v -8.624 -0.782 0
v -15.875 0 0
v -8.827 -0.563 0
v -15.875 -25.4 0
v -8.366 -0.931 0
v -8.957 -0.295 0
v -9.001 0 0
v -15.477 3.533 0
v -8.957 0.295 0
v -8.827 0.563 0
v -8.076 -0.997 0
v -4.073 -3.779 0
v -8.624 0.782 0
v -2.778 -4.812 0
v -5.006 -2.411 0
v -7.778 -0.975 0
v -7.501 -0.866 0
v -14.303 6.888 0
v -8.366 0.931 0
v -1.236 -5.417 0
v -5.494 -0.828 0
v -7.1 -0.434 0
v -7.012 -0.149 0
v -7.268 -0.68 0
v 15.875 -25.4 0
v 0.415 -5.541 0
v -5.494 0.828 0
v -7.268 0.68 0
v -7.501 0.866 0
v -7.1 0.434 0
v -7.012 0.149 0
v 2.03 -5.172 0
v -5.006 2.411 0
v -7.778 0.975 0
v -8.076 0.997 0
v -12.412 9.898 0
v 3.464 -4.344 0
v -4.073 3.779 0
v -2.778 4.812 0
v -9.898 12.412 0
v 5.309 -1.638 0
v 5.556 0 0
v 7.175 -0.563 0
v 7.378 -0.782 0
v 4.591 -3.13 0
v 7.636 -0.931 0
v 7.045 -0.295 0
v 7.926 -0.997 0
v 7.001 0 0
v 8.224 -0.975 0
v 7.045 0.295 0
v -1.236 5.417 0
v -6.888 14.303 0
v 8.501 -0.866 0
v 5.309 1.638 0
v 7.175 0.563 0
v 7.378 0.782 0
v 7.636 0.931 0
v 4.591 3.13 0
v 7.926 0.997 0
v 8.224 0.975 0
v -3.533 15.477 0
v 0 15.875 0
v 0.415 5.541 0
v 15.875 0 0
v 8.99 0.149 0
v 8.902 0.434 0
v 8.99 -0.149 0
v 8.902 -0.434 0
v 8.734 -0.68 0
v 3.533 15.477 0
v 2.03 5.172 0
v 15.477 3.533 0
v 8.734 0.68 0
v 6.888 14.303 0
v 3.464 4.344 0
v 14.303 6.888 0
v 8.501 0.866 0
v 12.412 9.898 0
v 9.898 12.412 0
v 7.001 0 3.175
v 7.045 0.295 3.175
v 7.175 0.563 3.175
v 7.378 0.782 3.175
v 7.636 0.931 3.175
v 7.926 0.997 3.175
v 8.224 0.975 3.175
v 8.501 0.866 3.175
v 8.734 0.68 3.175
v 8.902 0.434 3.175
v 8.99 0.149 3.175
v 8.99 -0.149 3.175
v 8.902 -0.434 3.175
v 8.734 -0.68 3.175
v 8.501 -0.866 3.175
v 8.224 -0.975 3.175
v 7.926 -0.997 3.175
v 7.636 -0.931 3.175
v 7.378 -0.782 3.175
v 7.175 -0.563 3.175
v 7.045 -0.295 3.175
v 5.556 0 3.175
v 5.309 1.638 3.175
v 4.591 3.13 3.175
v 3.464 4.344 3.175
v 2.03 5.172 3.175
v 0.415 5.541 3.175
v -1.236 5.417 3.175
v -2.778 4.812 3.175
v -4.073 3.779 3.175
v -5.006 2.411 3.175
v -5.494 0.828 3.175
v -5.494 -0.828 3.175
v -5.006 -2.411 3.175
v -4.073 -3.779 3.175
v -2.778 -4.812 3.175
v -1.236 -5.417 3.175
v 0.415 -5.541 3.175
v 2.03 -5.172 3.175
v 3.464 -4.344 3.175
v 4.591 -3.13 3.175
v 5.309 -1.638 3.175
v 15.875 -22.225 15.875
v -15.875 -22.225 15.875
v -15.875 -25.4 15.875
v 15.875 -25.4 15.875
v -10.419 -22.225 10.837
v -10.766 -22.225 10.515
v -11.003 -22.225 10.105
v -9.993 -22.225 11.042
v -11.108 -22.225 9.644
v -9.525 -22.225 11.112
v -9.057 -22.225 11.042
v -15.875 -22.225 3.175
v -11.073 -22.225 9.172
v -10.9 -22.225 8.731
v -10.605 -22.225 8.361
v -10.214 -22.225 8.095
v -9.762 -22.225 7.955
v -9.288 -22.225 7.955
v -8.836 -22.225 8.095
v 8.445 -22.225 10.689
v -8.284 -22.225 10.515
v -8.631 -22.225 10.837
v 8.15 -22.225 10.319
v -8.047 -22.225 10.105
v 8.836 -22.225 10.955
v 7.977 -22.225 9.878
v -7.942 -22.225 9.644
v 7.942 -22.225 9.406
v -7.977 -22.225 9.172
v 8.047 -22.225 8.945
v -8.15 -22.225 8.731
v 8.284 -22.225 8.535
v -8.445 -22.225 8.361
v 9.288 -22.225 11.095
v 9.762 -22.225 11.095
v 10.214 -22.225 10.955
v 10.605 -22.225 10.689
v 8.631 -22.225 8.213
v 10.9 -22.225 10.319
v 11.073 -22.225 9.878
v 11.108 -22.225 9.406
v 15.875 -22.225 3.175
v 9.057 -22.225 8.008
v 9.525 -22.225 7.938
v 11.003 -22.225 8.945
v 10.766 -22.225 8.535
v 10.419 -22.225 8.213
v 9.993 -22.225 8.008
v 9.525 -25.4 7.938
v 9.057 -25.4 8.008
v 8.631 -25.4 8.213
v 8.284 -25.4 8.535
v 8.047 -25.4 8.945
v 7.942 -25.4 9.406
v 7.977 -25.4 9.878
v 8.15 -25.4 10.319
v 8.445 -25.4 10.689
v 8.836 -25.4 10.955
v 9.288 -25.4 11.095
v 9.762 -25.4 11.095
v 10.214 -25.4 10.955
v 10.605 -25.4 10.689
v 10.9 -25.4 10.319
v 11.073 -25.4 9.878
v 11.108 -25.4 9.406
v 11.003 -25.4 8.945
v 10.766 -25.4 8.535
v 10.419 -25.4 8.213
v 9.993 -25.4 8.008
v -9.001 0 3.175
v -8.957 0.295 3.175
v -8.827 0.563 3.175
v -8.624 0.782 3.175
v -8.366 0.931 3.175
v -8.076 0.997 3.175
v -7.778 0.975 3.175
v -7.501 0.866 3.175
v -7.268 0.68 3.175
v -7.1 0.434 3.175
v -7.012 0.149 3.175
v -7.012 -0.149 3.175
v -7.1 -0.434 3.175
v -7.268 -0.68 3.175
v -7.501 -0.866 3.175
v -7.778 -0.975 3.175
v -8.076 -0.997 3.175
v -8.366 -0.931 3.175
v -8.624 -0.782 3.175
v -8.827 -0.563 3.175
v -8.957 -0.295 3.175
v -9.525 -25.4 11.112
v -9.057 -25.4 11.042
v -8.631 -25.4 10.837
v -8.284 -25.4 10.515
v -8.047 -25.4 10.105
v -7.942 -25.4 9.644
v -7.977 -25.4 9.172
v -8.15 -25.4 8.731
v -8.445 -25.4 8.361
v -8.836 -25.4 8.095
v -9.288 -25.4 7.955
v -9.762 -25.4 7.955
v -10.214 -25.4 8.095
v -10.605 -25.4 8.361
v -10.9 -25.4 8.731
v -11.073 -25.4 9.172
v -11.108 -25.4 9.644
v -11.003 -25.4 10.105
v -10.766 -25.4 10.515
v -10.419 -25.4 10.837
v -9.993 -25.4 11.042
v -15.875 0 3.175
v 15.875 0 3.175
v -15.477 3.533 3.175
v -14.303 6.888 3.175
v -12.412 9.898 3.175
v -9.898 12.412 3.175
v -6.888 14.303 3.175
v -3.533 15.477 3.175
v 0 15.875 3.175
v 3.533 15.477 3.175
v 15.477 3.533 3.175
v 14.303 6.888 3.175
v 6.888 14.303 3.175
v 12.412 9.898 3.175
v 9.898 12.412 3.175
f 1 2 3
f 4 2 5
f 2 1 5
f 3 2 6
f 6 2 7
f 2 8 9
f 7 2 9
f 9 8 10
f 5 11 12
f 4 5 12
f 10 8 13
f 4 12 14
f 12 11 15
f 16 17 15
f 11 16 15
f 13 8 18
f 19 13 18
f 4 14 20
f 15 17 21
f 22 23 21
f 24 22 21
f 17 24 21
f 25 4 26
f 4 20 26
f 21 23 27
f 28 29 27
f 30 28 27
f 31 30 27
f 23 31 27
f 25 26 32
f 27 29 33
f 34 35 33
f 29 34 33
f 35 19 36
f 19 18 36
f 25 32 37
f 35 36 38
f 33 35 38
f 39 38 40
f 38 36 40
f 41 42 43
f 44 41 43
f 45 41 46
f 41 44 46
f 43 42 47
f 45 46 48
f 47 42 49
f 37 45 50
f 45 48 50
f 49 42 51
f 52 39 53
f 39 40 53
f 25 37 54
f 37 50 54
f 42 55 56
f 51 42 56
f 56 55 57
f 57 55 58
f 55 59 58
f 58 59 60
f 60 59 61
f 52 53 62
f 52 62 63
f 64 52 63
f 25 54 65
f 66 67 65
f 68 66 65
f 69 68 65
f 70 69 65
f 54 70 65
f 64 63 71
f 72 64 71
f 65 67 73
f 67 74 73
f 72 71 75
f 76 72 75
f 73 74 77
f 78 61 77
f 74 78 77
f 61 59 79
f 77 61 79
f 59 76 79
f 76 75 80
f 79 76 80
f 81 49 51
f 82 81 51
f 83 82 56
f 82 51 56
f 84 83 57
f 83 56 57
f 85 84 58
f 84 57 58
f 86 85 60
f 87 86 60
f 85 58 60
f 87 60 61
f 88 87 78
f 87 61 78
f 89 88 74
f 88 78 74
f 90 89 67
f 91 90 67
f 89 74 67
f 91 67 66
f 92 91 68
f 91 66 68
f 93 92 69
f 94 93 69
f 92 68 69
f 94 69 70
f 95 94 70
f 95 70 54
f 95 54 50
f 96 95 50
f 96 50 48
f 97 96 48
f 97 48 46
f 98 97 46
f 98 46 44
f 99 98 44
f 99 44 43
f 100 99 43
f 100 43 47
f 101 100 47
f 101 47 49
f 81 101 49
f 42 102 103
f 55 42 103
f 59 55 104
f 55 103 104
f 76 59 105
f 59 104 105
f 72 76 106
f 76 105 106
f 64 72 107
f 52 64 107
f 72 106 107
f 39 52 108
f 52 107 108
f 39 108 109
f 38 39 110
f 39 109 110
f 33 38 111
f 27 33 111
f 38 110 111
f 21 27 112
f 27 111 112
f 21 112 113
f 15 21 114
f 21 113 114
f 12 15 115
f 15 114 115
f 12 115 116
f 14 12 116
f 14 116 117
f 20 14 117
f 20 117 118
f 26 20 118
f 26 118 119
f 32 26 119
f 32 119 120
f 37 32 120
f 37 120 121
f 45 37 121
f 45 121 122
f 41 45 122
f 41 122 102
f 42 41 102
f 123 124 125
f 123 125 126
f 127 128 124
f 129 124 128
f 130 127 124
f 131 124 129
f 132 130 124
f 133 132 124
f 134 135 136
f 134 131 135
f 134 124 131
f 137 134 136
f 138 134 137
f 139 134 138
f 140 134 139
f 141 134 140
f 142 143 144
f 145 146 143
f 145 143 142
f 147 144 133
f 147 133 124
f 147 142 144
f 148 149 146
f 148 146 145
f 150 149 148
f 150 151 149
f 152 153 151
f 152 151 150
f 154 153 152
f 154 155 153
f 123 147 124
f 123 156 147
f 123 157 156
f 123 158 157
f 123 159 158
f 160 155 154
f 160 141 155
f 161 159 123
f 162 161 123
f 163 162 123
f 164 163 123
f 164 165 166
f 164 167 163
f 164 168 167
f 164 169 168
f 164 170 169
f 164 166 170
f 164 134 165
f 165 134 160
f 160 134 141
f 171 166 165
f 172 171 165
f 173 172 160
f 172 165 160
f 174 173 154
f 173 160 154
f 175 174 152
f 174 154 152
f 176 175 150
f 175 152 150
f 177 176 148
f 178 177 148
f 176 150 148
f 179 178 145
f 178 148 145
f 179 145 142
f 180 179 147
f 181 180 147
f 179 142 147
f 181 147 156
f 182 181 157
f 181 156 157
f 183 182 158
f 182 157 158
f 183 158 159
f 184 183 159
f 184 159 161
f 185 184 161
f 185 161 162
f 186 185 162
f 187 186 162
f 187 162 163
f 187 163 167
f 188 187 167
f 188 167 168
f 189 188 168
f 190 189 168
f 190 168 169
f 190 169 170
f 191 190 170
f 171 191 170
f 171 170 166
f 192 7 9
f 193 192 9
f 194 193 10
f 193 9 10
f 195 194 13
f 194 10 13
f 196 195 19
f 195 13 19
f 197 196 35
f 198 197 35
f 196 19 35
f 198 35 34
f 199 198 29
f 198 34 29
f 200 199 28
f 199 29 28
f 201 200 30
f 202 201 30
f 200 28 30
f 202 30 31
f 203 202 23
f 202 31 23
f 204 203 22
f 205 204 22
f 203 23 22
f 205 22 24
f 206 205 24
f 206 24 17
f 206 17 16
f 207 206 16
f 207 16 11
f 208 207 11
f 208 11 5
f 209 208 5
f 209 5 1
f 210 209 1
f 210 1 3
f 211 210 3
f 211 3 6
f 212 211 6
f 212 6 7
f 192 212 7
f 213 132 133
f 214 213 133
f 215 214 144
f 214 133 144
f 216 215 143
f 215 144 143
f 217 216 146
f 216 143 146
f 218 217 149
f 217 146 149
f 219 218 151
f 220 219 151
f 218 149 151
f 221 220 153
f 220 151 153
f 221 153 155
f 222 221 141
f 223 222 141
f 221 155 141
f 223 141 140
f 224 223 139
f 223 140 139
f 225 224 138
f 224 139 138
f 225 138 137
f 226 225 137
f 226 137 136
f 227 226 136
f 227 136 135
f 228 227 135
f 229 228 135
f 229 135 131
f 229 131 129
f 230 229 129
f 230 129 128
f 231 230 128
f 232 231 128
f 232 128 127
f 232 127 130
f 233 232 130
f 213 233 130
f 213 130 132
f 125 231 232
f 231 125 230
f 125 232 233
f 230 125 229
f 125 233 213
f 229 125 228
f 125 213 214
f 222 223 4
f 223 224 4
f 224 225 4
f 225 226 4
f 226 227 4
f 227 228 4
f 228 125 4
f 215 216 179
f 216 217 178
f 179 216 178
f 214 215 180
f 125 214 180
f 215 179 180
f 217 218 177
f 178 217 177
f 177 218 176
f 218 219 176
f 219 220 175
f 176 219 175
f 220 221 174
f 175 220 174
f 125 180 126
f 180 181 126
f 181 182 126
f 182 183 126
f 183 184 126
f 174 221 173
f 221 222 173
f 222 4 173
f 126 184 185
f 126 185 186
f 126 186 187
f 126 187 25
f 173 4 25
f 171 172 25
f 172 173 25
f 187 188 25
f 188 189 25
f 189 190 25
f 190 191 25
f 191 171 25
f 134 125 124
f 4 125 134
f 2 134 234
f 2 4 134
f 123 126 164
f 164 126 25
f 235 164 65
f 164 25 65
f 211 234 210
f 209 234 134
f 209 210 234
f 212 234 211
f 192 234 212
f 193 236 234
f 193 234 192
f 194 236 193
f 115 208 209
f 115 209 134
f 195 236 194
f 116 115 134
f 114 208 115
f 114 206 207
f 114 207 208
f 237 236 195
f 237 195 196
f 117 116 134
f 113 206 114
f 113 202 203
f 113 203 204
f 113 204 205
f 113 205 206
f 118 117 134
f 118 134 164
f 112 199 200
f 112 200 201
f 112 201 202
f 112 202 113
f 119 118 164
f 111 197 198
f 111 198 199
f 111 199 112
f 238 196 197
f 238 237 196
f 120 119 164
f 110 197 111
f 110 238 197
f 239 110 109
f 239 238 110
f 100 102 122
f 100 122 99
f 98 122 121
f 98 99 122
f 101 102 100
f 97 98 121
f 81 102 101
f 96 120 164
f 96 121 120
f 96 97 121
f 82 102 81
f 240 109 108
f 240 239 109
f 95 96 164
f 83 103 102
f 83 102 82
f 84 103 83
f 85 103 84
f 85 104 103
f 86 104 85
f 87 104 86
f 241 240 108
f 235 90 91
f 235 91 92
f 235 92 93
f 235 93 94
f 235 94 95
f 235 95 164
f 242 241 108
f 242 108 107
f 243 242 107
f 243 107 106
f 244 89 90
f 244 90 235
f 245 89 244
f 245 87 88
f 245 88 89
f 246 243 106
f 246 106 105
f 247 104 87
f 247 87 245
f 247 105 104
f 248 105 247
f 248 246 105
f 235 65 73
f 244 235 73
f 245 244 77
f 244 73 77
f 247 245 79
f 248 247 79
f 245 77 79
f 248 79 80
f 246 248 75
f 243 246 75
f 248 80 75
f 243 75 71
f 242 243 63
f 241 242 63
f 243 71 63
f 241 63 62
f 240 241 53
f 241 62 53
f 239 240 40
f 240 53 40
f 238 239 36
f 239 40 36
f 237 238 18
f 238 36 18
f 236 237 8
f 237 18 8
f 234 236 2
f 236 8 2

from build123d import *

# Parameters (mm, degrees)
BOSS_EXTRUDE1_DEPTH       = 3.175
SKETCH3_R                 = 5.55625
CUT_EXTRUDE1_DEPTH        = 31.120694713
SKETCH4_W                 = 31.75
SKETCH4_H                 = 3.175
BOSS_EXTRUDE2_DEPTH       = 12.7
SKETCH5_R                 = 1.5875
CUT_EXTRUDE2_DEPTH        = 45.22263278
F_2_0MM_DOWEL_HOLE1_D     = 2
F_2_0MM_DOWEL_HOLE1_DEPTH = 12.7
F_2_0MM_DOWEL_HOLE1_TIP   = 0.600860619


with BuildPart() as part:
    # Sketch1 → Boss-Extrude1 (new body)
    with BuildSketch(Plane.XY):
        with BuildLine():
            ThreePointArc((15.875, 0), (0, 15.875), (-15.875, 0))
            Line((-15.875, 0), (15.875, 0))
        make_face()
        with BuildLine():
            ThreePointArc((15.875, 0), (0, -15.875), (-15.875, 0))
            Line((-15.875, 0), (-15.875, -25.4))
            Line((-15.875, -25.4), (15.875, -25.4))
            Line((15.875, -25.4), (15.875, 0))
        make_face()
        with BuildLine():
            Line((15.875, 0), (-15.875, 0))
            ThreePointArc((-15.875, 0), (0, -15.875), (15.875, 0))
        make_face()
    extrude(amount=BOSS_EXTRUDE1_DEPTH)

    # Sketch3 → Cut-Extrude1 (cut, through all)
    with BuildSketch(Plane.XY.offset(3.175)):
        Circle(SKETCH3_R)
    extrude(amount=-CUT_EXTRUDE1_DEPTH, mode=Mode.SUBTRACT)

    # Sketch4 → Boss-Extrude2 (add)
    with BuildSketch(Plane.XY.offset(3.175)):
        with Locations((0, -23.8125)):
            Rectangle(SKETCH4_W, SKETCH4_H)
    extrude(amount=BOSS_EXTRUDE2_DEPTH)

    # Sketch5 → Cut-Extrude2 (cut, through all)
    with BuildSketch(Plane(origin=(0, -22.225, 0), x_dir=(1, 0, 0), z_dir=(0, 1, 0))):
        with Locations(Location((-9.525, -9.525, 0), (0, 0, 270))):
            Circle(SKETCH5_R)
        with Locations(Location((9.525, -9.525, 0), (0, 0, 90))):
            Circle(SKETCH5_R)
    extrude(amount=-CUT_EXTRUDE2_DEPTH, mode=Mode.SUBTRACT)

    # Ø2.0mm Dowel Hole1
    with Locations(Plane.XY.offset(3.175)):
        with Locations((-8.001, 0), (8.001, 0)):
            Hole(F_2_0MM_DOWEL_HOLE1_D / 2, depth=F_2_0MM_DOWEL_HOLE1_DEPTH)
            with Locations((0, 0, -(F_2_0MM_DOWEL_HOLE1_DEPTH + F_2_0MM_DOWEL_HOLE1_TIP / 2))):  # 118° drill point
                Cone(0, F_2_0MM_DOWEL_HOLE1_D / 2, F_2_0MM_DOWEL_HOLE1_TIP, mode=Mode.SUBTRACT)


solid = part.part
